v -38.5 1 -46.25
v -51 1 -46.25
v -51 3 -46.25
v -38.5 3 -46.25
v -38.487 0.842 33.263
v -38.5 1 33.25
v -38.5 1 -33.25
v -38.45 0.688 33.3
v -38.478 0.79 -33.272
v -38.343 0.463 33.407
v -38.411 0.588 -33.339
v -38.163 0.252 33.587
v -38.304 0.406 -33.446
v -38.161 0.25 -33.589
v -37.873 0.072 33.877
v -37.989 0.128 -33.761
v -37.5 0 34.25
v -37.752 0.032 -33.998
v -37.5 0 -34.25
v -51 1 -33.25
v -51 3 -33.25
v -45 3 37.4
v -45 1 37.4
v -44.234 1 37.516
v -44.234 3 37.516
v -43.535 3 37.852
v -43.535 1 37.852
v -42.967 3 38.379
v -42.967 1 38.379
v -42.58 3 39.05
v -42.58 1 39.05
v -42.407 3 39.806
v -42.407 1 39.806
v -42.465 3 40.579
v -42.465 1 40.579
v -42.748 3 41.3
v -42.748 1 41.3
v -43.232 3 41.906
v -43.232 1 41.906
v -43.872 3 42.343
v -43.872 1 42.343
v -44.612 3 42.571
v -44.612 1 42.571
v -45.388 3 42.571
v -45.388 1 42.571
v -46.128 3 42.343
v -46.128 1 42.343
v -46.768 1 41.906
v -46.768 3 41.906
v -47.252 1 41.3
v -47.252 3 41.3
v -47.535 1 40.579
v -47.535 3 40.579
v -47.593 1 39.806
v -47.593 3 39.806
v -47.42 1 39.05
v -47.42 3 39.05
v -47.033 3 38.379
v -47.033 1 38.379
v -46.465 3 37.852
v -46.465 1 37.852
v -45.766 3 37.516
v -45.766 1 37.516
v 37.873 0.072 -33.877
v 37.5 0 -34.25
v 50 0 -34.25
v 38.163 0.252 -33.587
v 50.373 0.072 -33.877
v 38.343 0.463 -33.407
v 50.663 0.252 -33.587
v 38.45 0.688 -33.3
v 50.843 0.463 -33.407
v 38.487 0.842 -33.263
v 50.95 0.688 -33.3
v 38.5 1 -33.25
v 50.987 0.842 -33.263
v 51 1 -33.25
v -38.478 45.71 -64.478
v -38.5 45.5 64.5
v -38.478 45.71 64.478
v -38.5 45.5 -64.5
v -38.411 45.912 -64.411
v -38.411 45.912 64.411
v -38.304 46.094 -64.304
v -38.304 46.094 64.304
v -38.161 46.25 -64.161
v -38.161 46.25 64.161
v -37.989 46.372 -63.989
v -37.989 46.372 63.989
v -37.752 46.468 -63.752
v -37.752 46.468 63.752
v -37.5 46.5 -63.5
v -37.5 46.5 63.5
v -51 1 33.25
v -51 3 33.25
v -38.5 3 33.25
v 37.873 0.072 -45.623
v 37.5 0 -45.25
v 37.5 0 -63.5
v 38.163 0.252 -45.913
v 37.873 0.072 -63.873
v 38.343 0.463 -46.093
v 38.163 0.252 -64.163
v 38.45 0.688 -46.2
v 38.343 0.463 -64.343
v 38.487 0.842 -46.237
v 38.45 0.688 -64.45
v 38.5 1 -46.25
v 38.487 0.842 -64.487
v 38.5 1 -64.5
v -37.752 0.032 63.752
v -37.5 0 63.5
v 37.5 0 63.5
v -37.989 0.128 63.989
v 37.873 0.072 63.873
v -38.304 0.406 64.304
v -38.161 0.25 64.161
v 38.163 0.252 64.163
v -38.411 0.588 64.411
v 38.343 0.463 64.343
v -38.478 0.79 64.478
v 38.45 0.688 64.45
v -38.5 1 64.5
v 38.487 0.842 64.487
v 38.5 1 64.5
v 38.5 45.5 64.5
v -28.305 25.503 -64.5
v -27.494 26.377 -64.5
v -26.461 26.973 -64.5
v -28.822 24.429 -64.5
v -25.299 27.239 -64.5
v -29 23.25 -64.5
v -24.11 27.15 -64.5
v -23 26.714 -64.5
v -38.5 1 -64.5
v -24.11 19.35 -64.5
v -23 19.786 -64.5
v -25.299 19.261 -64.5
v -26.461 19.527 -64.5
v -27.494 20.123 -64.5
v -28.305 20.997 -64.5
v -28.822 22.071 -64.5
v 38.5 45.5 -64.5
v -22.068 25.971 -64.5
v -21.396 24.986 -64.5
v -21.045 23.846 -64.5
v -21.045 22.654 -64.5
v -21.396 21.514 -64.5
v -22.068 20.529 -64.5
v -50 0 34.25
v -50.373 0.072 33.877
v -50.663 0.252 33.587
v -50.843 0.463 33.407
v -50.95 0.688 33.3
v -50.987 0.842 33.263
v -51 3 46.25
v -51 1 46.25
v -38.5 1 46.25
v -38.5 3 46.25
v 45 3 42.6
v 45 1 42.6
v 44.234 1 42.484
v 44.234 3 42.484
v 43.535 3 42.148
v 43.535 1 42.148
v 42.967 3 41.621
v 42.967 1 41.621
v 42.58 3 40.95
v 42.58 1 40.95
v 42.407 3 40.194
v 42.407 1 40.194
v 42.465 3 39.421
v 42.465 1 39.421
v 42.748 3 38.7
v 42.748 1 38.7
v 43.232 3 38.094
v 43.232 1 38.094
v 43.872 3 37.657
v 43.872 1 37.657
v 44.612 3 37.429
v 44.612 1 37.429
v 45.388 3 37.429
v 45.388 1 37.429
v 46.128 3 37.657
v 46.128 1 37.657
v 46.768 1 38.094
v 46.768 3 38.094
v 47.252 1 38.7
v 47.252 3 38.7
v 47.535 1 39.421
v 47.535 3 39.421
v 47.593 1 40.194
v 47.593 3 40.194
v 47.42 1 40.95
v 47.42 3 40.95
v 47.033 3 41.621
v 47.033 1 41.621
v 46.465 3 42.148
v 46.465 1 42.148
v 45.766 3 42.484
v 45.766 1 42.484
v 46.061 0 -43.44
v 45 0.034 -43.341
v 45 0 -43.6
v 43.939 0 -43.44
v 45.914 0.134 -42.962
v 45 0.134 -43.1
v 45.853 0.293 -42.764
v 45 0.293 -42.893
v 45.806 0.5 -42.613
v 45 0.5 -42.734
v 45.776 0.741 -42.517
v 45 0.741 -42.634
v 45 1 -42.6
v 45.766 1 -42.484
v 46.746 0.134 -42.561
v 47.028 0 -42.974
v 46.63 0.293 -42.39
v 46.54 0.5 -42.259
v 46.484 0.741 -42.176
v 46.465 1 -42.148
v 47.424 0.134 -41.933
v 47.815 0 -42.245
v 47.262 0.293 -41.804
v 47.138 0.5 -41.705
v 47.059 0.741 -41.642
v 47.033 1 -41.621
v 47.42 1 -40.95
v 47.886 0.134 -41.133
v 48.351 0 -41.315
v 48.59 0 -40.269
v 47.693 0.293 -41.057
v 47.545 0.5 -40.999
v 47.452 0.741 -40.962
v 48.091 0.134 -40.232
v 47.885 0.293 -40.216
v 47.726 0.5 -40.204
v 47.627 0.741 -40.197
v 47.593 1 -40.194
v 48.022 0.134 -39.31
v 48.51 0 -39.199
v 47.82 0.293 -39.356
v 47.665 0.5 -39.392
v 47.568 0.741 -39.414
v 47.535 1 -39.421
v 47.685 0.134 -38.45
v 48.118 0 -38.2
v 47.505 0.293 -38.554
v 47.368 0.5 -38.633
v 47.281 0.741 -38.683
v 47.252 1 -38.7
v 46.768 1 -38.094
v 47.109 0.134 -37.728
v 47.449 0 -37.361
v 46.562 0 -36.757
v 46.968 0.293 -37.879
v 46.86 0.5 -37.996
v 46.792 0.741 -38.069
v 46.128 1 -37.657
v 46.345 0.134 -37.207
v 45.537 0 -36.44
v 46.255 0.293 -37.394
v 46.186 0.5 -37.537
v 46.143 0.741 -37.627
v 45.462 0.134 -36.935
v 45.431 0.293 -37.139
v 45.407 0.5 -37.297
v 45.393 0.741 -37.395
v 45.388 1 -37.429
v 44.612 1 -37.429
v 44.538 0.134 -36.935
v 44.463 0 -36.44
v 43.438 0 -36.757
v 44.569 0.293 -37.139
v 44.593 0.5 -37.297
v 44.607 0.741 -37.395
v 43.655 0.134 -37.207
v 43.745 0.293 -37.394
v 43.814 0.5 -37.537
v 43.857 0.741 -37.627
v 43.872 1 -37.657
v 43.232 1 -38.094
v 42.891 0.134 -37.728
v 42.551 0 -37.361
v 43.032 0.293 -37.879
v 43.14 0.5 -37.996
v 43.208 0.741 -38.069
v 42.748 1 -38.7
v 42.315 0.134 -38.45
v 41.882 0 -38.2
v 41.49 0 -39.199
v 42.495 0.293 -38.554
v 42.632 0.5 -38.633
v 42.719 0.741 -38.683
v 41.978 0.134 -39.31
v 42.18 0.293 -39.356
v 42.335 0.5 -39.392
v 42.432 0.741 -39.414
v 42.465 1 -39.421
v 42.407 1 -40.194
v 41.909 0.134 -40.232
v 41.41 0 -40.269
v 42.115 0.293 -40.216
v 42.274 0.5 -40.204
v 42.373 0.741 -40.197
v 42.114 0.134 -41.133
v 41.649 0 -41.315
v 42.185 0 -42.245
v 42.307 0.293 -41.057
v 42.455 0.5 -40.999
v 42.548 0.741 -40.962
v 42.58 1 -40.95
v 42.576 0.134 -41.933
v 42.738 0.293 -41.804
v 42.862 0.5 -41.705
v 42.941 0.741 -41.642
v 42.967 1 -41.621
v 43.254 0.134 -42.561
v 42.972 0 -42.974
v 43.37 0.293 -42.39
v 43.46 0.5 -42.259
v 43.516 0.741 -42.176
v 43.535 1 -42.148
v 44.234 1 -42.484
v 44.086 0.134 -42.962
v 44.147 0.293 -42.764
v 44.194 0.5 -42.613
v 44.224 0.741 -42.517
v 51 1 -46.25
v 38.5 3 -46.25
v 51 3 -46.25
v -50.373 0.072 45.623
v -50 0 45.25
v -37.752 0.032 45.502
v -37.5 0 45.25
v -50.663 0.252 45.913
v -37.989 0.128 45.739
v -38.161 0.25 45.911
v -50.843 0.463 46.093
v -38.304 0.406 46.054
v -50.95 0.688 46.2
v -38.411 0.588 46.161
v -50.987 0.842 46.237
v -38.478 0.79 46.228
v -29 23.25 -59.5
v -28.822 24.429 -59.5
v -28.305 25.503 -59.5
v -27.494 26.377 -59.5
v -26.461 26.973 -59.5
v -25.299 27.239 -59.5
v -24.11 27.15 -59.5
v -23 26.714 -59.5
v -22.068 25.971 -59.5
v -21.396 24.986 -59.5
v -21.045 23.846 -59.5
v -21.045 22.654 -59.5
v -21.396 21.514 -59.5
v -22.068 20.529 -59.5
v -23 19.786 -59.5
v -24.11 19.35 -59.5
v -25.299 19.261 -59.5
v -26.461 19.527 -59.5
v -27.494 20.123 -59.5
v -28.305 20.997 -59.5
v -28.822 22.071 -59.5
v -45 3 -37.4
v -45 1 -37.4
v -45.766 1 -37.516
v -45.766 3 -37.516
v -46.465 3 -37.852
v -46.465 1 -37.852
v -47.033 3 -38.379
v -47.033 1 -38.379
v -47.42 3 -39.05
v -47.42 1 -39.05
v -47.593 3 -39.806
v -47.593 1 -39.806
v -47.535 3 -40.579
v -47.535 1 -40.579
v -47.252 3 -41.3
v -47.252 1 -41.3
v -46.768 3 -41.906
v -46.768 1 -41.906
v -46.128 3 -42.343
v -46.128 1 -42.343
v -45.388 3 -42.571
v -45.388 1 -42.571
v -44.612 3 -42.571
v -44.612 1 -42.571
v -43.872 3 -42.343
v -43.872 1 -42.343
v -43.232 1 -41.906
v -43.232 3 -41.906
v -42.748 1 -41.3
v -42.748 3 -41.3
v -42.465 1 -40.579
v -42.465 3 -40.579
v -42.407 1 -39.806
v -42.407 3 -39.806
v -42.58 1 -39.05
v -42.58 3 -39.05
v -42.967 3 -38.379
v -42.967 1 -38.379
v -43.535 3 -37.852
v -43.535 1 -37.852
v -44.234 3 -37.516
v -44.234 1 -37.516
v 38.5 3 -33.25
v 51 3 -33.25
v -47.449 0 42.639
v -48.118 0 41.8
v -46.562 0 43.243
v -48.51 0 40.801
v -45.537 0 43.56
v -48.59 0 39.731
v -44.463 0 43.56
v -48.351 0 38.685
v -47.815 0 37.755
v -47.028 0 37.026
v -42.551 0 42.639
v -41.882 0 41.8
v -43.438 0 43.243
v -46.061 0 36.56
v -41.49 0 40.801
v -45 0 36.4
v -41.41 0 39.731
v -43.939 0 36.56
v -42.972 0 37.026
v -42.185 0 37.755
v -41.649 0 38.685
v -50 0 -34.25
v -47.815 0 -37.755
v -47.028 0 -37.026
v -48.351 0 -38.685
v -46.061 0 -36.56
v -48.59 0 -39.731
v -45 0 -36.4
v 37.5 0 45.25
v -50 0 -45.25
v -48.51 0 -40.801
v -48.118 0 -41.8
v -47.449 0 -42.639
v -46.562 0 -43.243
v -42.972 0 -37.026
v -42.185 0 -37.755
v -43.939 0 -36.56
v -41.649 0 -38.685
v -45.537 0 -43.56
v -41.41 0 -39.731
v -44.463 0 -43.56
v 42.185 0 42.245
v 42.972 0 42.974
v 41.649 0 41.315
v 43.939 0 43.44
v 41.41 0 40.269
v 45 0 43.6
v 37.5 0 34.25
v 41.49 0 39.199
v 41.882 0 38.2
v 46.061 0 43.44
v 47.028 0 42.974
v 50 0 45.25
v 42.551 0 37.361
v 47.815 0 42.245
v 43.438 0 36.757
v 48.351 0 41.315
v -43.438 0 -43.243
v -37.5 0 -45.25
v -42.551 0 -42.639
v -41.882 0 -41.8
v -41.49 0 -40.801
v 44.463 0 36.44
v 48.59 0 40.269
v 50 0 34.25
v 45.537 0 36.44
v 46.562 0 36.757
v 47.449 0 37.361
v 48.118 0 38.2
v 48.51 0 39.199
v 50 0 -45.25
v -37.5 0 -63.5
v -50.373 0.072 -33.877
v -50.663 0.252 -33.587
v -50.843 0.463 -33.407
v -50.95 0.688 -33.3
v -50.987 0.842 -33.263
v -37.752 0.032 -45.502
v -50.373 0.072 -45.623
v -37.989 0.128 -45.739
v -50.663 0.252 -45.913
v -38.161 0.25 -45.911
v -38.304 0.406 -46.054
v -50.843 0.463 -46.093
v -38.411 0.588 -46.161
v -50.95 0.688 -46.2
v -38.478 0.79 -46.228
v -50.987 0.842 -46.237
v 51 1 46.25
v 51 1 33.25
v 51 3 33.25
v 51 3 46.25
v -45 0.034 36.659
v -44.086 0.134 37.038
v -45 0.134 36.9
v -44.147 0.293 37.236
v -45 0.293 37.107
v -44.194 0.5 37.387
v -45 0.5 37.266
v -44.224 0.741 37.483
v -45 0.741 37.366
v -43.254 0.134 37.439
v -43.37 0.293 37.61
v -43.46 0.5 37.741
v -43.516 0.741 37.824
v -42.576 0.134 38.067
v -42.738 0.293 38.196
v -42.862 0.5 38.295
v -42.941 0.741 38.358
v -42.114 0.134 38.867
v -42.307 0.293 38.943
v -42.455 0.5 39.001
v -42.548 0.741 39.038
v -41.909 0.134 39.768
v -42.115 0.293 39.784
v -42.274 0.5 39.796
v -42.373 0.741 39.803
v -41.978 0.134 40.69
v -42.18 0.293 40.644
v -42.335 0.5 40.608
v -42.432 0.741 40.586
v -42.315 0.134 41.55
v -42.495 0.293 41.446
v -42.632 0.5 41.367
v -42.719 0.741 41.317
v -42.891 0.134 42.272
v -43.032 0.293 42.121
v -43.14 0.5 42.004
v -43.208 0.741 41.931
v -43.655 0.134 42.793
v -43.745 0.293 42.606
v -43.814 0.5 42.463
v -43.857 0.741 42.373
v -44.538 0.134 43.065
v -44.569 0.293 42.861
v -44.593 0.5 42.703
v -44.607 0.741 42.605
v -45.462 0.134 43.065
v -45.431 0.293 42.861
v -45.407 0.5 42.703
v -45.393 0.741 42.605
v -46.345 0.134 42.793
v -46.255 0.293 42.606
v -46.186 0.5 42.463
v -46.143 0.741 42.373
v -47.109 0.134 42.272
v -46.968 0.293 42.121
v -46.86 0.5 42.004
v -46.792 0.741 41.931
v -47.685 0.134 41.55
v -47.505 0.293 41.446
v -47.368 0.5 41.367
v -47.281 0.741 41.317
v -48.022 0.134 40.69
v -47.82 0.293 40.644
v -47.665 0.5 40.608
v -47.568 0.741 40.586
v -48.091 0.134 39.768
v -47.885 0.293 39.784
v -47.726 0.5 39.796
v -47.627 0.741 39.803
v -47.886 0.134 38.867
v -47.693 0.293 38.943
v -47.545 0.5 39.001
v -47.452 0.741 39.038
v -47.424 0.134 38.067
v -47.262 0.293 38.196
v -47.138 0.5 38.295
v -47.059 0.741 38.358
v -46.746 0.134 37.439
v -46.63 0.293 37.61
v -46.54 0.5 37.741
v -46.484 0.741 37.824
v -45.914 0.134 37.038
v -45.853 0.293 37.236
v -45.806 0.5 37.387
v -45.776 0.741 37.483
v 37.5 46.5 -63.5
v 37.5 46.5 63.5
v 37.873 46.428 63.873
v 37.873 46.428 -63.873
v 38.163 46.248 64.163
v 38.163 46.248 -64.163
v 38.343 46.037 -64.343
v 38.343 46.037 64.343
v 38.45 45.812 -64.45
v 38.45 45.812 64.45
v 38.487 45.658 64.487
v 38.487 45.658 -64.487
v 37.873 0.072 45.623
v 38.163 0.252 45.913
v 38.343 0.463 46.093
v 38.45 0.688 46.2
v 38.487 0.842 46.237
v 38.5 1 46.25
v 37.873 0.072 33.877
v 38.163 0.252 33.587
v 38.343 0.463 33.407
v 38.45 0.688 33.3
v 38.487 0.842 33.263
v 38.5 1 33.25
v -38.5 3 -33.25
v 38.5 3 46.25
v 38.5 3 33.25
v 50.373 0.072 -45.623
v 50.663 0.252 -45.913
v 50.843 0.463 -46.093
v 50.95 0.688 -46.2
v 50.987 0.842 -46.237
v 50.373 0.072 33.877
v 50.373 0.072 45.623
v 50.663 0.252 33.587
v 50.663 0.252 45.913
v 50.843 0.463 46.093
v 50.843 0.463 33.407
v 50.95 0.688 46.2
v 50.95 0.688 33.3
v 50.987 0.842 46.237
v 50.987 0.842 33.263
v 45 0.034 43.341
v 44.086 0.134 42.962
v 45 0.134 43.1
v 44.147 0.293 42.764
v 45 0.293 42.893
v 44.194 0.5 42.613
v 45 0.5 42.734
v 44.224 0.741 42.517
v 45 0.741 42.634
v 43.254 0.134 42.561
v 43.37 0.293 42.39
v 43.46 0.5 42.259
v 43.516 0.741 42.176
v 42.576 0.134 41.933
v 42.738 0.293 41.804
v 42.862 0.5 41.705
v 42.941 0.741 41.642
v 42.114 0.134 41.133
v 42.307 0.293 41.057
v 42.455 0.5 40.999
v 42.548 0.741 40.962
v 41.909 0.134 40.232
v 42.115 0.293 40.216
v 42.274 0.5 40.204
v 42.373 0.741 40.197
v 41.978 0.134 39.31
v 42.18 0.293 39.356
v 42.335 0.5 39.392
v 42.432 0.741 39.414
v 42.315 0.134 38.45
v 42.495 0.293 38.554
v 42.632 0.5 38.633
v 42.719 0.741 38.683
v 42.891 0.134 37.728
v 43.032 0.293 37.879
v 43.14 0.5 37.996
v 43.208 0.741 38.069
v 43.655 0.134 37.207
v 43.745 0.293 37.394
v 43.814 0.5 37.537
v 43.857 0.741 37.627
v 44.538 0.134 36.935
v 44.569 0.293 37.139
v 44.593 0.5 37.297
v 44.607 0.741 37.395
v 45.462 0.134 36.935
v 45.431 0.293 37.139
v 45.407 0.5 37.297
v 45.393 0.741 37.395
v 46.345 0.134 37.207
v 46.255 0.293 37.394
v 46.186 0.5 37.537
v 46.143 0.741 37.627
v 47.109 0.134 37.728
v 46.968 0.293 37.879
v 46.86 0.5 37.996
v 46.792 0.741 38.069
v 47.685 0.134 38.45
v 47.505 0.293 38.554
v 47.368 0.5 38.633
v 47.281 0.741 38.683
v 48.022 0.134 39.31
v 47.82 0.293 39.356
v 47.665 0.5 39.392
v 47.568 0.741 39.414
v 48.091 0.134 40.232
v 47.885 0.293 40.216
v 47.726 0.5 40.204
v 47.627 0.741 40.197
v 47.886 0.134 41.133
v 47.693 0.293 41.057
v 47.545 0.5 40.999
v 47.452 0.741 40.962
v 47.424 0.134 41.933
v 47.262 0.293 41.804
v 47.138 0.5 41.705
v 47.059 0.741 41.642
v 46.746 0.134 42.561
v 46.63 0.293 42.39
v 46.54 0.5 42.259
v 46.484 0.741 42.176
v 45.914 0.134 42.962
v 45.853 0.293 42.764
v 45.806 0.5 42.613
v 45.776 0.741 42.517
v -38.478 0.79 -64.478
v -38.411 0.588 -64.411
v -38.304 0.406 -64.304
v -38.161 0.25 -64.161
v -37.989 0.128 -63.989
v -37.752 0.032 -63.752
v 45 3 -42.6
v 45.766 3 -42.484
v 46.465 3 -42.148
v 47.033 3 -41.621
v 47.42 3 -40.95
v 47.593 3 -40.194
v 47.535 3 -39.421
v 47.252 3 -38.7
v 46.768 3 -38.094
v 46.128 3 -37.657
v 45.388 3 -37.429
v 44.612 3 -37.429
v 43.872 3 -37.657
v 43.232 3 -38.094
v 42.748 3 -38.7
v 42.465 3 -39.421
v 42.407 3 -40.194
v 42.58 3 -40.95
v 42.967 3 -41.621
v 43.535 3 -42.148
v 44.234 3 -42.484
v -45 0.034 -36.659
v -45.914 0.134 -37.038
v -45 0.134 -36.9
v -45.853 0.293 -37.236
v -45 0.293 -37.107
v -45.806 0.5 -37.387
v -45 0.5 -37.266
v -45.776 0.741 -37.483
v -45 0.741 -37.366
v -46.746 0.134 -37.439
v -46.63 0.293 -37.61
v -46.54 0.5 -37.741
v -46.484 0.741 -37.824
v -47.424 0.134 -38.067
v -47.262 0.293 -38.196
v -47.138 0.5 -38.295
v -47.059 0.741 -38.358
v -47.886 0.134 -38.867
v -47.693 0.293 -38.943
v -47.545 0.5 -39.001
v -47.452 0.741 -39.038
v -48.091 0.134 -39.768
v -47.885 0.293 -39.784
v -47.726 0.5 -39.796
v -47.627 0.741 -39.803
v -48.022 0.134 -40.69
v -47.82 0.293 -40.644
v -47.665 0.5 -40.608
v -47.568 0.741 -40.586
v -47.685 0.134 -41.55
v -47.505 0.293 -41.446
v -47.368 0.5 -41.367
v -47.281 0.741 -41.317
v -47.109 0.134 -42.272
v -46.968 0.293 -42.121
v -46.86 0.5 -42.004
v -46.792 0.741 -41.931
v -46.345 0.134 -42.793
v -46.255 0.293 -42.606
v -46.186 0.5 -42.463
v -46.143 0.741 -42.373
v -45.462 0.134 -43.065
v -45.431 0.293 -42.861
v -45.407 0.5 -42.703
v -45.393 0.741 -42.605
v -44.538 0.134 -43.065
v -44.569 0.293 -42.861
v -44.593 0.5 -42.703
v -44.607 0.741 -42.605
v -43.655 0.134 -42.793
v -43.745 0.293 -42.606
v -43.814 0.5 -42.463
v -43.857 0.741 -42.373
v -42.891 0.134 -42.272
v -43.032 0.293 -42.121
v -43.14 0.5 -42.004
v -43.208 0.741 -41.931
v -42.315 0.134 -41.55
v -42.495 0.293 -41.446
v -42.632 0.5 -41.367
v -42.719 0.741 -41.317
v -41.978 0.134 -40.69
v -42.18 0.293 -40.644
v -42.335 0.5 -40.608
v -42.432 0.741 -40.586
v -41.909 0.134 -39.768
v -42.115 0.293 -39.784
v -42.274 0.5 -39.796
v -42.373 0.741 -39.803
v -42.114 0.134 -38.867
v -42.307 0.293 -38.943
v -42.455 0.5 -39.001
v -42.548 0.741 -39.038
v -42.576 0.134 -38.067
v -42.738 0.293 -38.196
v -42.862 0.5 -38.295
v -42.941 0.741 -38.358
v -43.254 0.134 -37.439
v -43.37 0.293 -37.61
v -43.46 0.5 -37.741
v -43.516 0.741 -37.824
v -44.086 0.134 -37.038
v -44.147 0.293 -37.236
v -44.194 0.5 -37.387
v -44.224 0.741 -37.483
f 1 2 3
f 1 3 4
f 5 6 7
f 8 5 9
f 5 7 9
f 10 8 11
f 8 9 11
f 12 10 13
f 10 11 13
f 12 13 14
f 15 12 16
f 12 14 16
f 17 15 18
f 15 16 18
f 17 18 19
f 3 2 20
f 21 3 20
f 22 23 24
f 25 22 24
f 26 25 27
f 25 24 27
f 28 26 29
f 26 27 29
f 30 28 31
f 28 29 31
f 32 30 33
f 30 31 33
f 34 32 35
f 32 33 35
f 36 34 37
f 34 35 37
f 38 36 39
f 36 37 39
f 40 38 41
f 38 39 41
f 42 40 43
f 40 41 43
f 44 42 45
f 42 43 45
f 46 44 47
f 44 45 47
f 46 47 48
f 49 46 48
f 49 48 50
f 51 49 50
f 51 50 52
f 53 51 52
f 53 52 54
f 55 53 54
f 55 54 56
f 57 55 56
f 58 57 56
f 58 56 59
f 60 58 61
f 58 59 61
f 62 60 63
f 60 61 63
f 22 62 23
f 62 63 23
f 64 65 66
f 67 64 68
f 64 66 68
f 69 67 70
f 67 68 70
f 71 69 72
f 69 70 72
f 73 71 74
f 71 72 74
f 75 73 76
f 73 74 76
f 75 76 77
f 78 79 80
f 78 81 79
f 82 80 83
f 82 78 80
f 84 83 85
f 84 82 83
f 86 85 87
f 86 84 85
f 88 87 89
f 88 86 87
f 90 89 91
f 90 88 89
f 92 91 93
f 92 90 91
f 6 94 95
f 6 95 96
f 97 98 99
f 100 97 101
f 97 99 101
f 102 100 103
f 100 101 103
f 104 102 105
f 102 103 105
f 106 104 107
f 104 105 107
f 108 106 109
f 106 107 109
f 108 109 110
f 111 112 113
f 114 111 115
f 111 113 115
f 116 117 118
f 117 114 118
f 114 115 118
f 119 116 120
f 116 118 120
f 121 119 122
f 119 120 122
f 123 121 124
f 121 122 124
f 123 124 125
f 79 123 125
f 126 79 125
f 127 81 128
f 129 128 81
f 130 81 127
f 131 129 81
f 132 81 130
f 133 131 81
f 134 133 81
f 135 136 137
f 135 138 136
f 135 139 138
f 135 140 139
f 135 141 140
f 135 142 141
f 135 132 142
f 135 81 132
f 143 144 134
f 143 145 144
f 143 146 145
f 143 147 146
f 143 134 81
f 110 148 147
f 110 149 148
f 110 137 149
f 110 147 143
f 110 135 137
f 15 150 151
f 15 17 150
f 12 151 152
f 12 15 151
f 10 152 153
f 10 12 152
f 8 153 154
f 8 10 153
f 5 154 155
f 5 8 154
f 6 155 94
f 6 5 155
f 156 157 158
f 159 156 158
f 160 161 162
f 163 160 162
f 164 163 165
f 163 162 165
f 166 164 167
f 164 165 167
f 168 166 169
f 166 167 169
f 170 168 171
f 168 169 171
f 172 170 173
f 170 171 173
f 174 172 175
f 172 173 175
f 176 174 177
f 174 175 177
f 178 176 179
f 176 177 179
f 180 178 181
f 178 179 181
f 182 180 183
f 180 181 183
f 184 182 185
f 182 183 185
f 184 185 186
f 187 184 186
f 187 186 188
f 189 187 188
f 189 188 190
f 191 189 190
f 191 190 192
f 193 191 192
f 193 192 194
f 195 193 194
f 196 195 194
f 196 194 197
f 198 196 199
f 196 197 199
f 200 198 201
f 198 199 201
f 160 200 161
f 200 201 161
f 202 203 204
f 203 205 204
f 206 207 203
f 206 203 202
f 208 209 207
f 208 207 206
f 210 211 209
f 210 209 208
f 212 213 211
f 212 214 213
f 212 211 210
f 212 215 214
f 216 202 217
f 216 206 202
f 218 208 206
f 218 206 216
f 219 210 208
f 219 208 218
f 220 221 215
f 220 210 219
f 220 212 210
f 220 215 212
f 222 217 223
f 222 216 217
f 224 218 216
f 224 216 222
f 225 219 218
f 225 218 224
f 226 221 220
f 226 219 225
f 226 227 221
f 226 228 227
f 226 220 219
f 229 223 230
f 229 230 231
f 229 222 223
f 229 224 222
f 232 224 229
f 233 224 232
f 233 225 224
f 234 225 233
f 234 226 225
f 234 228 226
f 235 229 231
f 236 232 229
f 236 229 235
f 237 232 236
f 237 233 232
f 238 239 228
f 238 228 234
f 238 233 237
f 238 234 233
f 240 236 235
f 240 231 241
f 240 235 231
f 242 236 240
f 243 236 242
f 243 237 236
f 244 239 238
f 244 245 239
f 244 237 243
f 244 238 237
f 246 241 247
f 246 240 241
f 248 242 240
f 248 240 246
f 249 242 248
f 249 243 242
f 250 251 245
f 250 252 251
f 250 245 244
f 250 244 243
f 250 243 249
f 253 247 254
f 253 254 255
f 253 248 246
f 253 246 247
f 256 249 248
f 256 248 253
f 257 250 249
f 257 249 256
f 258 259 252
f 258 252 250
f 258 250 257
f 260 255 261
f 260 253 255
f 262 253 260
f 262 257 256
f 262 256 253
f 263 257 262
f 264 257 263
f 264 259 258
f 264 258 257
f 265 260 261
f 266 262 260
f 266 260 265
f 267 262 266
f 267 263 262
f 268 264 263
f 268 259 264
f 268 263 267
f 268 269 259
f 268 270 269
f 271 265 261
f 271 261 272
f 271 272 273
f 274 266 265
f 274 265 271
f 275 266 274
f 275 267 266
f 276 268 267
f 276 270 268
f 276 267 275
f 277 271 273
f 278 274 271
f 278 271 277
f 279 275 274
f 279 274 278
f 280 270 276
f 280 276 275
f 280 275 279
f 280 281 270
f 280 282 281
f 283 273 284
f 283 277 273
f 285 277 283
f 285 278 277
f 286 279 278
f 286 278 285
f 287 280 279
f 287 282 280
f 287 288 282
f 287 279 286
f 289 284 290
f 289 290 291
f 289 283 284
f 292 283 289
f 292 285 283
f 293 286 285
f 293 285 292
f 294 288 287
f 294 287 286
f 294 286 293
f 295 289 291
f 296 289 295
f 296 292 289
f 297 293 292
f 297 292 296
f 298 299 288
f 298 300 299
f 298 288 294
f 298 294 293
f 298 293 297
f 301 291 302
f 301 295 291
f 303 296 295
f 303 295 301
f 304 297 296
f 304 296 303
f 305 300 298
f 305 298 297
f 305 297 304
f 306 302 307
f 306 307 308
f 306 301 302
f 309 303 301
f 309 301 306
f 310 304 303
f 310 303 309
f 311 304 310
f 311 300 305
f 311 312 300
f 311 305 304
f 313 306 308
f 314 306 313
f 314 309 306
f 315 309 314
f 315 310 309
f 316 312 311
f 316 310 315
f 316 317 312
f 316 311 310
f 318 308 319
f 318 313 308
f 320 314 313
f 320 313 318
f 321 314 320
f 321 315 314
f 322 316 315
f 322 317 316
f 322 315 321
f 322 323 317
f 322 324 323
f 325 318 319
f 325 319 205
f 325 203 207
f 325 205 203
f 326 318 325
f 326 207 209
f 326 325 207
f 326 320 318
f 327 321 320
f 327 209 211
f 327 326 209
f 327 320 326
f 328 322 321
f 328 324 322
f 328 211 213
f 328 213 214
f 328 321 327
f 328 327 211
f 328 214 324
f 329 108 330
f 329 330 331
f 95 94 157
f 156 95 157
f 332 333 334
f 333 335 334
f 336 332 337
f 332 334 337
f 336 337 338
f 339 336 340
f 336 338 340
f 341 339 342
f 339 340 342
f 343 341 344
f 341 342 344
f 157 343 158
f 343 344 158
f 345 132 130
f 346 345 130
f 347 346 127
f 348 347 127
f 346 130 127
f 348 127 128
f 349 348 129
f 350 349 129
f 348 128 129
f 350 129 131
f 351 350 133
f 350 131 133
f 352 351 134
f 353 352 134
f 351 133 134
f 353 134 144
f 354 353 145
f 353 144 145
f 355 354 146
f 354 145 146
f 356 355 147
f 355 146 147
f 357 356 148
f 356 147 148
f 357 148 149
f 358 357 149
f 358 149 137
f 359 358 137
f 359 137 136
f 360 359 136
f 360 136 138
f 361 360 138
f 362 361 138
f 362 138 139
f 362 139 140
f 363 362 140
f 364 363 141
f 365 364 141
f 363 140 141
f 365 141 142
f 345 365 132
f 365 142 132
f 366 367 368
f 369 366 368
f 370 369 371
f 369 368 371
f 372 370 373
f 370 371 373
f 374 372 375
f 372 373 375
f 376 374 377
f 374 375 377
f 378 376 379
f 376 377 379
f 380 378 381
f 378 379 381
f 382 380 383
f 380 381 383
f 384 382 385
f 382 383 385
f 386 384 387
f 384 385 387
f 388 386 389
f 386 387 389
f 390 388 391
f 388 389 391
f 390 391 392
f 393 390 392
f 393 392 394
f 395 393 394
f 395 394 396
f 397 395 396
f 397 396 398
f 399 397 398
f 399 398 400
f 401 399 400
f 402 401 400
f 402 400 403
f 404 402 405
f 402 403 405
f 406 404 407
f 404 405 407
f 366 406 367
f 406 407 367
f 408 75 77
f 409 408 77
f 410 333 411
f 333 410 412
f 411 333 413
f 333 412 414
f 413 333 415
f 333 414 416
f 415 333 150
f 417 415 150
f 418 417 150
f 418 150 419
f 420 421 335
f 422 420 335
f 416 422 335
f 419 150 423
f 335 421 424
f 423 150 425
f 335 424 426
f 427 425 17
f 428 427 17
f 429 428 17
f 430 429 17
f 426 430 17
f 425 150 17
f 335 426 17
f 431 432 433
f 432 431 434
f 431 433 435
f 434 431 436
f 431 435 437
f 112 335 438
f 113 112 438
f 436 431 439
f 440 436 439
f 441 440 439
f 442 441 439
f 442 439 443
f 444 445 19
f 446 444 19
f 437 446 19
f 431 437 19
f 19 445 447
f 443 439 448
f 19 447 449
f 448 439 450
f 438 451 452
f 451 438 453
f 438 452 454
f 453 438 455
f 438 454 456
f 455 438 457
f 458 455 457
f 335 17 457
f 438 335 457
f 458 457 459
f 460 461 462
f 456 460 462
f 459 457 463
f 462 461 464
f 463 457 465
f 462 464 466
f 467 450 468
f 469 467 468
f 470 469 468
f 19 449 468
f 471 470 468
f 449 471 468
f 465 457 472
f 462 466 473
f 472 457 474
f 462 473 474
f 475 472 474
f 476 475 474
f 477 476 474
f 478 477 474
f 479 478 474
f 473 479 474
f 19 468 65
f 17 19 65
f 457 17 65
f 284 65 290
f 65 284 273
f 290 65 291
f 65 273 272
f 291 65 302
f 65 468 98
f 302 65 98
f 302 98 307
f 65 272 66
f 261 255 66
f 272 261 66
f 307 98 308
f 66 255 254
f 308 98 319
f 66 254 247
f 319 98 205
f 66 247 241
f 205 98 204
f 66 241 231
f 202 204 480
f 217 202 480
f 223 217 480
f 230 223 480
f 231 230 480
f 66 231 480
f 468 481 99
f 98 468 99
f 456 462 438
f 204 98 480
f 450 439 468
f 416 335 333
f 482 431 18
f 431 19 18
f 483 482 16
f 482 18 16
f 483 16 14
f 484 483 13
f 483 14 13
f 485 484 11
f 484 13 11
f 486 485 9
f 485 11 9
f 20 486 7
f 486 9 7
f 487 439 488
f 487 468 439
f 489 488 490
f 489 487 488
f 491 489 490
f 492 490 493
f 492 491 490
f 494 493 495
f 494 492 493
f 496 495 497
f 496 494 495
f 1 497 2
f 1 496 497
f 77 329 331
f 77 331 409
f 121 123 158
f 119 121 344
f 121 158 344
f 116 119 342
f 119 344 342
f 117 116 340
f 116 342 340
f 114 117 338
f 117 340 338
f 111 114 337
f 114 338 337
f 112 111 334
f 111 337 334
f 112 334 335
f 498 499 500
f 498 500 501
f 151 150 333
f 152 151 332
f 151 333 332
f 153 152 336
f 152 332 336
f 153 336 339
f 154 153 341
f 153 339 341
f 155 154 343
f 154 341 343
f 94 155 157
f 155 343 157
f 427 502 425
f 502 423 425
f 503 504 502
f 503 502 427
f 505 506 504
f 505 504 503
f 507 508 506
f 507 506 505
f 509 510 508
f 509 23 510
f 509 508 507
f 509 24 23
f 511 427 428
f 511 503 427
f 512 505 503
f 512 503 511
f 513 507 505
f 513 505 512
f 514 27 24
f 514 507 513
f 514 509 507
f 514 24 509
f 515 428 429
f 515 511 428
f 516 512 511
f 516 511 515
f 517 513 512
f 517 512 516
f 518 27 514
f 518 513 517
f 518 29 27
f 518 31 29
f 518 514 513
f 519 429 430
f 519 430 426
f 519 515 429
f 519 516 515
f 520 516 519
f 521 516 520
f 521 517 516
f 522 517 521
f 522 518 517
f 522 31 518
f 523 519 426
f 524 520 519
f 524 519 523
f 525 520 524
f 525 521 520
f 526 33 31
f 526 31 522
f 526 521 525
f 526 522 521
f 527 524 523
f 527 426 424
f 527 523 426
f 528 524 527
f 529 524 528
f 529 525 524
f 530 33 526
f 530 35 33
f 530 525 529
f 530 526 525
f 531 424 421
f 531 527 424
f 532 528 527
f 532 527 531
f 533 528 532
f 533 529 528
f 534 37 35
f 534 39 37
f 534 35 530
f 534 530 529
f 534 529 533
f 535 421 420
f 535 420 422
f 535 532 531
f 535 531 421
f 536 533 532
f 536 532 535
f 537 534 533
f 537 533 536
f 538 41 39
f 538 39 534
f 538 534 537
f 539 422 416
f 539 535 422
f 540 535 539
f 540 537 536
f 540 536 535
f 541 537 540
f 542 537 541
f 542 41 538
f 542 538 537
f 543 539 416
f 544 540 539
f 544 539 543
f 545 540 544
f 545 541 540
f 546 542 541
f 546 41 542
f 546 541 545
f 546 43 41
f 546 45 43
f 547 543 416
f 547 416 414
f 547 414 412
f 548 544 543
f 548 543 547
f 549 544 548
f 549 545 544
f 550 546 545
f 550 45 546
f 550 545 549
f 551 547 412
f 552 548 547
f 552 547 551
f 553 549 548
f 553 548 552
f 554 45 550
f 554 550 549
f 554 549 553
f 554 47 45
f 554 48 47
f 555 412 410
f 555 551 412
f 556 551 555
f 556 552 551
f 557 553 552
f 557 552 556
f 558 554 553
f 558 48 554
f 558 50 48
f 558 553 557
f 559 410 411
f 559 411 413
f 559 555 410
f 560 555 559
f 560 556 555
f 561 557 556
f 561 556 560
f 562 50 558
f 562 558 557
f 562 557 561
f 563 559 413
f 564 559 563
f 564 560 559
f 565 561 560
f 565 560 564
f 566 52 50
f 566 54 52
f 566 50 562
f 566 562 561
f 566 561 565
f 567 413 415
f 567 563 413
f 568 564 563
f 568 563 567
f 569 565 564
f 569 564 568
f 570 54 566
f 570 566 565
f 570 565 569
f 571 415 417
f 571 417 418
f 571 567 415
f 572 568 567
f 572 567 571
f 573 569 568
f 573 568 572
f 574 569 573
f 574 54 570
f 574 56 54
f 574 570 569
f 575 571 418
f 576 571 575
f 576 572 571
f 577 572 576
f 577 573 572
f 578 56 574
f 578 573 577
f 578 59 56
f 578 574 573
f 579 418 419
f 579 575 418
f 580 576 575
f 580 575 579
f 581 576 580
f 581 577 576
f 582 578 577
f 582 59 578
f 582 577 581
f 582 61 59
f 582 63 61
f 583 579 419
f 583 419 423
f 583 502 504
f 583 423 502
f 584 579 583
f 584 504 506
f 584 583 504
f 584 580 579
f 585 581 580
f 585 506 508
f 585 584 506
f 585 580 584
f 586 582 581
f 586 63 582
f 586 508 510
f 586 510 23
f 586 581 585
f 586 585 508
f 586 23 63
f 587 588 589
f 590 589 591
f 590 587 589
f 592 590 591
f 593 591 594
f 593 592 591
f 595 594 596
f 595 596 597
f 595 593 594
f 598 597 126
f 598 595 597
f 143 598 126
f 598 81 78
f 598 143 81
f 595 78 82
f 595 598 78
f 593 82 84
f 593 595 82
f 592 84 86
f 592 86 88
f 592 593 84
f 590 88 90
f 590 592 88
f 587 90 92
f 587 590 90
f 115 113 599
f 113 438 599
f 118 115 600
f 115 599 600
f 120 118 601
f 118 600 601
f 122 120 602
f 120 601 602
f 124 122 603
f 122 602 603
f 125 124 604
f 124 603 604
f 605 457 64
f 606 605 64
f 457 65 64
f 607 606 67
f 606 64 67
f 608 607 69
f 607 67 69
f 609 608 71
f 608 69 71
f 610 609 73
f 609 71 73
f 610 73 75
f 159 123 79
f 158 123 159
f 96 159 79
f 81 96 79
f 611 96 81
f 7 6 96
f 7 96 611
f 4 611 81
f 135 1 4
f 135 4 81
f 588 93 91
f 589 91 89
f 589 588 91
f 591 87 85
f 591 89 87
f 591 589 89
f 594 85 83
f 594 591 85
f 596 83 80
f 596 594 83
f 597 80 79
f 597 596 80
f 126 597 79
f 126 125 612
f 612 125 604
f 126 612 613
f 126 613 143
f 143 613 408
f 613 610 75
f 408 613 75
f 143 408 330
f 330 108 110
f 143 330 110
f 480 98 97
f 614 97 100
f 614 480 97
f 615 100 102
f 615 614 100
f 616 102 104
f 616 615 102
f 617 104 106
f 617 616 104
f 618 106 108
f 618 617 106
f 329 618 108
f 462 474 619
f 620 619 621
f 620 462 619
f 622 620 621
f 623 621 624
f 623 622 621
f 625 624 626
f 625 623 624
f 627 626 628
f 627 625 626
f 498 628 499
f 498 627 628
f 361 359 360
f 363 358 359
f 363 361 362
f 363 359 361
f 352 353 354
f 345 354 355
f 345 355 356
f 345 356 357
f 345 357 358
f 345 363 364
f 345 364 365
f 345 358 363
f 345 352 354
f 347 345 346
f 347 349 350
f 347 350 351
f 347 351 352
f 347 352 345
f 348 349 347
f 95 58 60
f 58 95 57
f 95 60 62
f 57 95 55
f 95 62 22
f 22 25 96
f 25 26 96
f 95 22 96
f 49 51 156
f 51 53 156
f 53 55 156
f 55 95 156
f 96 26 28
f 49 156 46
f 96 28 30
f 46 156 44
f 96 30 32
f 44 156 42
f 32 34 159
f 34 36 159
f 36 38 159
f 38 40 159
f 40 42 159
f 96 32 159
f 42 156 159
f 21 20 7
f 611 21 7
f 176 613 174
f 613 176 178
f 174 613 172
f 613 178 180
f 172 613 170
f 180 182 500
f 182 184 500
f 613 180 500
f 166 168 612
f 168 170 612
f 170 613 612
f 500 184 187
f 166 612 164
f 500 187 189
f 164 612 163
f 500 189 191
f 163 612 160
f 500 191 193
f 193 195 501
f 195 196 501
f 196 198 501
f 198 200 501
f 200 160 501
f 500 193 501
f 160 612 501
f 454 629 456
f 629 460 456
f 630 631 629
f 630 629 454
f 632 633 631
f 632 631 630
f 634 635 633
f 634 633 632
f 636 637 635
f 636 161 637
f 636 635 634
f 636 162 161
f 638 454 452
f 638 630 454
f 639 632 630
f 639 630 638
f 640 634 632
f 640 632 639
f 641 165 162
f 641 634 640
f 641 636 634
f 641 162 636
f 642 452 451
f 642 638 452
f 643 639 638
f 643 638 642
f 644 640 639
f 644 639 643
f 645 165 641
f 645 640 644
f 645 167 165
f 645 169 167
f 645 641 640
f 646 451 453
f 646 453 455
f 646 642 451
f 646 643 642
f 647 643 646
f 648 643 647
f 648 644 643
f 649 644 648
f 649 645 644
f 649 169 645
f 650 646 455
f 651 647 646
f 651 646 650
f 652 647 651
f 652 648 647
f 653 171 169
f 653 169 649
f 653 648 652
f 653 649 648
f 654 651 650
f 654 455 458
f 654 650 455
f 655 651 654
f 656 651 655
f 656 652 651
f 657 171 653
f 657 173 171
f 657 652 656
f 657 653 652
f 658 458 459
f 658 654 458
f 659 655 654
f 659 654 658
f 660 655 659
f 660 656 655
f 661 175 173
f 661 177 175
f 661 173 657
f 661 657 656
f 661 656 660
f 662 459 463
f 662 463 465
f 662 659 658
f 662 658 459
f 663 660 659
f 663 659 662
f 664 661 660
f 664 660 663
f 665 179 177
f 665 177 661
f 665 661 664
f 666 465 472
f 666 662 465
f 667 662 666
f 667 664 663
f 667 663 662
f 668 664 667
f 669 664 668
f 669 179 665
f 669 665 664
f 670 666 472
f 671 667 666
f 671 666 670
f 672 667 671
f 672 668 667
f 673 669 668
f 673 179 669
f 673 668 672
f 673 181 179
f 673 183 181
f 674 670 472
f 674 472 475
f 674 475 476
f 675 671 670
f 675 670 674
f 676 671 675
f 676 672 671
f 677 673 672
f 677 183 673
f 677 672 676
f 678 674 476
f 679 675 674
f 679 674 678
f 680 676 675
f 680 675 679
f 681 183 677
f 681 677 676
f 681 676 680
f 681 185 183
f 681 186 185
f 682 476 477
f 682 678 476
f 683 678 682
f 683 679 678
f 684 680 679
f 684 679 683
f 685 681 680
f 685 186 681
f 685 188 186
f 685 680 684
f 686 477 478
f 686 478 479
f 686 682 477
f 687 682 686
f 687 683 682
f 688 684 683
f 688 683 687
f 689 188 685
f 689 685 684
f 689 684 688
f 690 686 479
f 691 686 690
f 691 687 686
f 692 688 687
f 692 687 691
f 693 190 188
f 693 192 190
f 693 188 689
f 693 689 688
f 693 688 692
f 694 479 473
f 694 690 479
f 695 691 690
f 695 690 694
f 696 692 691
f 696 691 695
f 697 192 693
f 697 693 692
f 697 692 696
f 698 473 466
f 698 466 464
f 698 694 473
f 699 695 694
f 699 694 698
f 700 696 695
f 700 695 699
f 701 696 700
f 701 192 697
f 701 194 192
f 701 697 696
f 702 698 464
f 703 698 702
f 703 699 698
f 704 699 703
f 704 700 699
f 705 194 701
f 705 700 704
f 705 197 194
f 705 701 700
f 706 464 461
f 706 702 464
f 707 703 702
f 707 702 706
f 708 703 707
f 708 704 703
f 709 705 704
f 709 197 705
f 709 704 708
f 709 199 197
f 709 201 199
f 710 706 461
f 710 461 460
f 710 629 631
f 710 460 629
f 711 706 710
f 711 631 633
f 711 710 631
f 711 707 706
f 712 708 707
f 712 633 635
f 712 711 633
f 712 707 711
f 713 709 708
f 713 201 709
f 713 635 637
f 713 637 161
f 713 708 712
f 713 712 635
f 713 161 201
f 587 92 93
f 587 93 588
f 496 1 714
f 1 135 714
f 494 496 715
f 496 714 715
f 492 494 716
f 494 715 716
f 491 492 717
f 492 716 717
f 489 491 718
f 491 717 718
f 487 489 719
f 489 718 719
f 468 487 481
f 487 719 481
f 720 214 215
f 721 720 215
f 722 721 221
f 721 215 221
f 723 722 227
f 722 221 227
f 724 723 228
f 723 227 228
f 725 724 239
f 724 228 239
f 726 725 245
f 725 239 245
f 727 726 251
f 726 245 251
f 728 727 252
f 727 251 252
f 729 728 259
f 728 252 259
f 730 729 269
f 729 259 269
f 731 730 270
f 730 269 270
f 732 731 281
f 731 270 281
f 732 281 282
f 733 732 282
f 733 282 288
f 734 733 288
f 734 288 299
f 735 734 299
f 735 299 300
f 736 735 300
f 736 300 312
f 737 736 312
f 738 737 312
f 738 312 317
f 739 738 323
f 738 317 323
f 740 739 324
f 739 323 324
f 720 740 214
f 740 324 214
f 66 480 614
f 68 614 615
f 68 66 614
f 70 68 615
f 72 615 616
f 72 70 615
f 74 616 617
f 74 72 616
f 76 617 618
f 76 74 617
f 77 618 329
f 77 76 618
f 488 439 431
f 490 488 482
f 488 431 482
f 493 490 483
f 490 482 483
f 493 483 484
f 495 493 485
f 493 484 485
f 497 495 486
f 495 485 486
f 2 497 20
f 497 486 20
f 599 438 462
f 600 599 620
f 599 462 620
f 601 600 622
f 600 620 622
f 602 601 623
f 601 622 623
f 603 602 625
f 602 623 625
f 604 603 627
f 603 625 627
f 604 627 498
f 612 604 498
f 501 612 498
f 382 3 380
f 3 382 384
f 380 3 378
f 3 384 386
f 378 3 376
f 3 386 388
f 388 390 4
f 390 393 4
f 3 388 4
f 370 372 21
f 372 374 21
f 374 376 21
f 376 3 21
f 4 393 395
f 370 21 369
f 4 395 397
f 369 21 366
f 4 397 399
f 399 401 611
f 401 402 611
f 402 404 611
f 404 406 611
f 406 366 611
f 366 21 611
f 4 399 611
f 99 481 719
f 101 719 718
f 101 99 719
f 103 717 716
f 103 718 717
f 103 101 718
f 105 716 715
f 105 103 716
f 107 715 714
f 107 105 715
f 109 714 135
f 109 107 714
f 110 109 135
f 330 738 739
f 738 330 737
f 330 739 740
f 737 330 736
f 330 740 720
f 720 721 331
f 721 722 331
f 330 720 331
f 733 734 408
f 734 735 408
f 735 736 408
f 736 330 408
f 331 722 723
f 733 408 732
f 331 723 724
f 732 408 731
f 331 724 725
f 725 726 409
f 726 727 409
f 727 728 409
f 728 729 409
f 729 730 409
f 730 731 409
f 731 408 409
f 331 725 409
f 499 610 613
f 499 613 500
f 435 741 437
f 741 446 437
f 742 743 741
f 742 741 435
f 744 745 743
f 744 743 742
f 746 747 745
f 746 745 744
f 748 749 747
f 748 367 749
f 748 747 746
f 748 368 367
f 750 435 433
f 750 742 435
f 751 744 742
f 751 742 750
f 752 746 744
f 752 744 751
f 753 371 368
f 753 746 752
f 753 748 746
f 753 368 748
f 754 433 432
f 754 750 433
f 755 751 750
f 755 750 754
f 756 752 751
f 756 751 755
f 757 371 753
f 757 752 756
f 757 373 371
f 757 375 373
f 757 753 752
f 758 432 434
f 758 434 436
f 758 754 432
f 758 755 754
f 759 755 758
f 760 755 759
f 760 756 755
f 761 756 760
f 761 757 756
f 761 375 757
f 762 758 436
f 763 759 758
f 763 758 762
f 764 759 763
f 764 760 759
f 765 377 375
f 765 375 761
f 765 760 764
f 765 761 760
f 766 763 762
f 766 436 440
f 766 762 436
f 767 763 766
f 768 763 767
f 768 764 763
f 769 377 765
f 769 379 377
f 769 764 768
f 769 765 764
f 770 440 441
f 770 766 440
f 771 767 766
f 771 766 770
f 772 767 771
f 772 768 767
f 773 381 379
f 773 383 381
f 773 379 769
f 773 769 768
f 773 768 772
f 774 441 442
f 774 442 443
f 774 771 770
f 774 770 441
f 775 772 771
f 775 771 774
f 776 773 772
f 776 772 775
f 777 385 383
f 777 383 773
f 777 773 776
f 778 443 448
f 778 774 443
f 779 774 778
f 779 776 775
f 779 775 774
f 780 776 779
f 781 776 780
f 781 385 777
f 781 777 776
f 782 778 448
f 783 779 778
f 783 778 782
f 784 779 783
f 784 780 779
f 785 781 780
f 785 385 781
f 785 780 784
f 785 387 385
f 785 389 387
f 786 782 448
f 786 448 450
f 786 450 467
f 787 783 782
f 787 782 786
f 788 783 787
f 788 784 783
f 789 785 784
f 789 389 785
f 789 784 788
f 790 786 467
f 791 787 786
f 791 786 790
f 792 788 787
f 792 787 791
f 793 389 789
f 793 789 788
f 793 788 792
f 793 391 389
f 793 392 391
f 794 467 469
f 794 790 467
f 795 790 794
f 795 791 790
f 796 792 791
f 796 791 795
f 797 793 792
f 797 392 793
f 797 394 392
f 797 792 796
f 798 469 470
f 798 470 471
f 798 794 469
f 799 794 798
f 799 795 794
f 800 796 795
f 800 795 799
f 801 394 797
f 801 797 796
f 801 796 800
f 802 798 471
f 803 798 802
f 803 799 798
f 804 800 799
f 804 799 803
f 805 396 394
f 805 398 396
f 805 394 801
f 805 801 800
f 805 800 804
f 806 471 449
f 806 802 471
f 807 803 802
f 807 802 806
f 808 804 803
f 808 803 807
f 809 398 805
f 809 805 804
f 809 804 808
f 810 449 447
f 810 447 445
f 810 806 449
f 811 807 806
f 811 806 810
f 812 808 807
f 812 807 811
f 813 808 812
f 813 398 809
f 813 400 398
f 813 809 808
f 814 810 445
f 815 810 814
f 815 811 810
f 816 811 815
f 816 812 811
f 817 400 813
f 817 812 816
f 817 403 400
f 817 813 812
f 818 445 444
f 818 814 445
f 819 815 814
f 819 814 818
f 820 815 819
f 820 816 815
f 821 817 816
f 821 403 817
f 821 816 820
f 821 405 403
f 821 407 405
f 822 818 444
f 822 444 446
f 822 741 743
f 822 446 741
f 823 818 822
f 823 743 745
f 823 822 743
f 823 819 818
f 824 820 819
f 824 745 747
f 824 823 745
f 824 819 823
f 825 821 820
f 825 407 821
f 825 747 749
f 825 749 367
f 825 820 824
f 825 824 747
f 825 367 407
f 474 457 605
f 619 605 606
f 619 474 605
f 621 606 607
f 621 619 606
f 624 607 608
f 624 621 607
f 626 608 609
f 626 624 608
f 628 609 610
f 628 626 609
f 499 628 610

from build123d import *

# Parameters (mm, degrees)
SKETCH_1_W          = 77
SKETCH_1_H          = 129
EXTRUDE_1_DEPTH     = 46.5
SKETCH_2_W          = 12.5
SKETCH_2_H          = 13
SKETCH_2_R          = 2.6
EXTRUDE_2_DEPTH     = 3
SKETCH_3_R          = 4
CUT_EXTRUDE_1_DEPTH = 5
FILLET_1_R          = 1


with BuildPart() as part:
    # 草图1 → 凸台-拉伸1 (new body)
    with BuildSketch(Plane(origin=(0, 0, 0), x_dir=(1, 0, 0), z_dir=(0, 1, 0))):
        Rectangle(SKETCH_1_W, SKETCH_1_H)
    extrude(amount=EXTRUDE_1_DEPTH)

    # 草图2 → 凸台-拉伸2 (add)
    # profile 1 of 4: a face of its own
    with BuildSketch(Plane.XZ):
        with Locations((-44.75, 39.75)):
            Rectangle(SKETCH_2_W, SKETCH_2_H)
        with Locations(Location((-45, 40, 0), (0, 0, 270))):
            Circle(SKETCH_2_R, mode=Mode.SUBTRACT)
    # profile 2 of 4: a face of its own
    with BuildSketch(Plane.XZ):
        with Locations((44.75, 39.75)):
            Rectangle(SKETCH_2_W, SKETCH_2_H)
        with Locations(Location((45, 40, 0), (0, 0, 90))):
            Circle(SKETCH_2_R, mode=Mode.SUBTRACT)
    # profile 3 of 4: a face of its own
    with BuildSketch(Plane.XZ):
        with Locations((44.75, -39.75)):
            Rectangle(SKETCH_2_W, SKETCH_2_H)
        with Locations(Location((45, -40, 0), (0, 0, 270))):
            Circle(SKETCH_2_R, mode=Mode.SUBTRACT)
    # profile 4 of 4: a face of its own
    with BuildSketch(Plane.XZ):
        with Locations((-44.75, -39.75)):
            Rectangle(SKETCH_2_W, SKETCH_2_H)
        with Locations(Location((-45, -40, 0), (0, 0, 90))):
            Circle(SKETCH_2_R, mode=Mode.SUBTRACT)
    extrude(amount=-EXTRUDE_2_DEPTH)

    # 草图3 → 切除-拉伸1 (cut)
    with BuildSketch(Plane(origin=(0, 0, -64.5), x_dir=(-1, 0, 0), z_dir=(0, 0, -1))):
        with Locations((25, 23.25)):
            Circle(SKETCH_3_R)
    extrude(amount=-CUT_EXTRUDE_1_DEPTH, mode=Mode.SUBTRACT)

    # 圆角1
    fillet_1_edges = [part.edges().sort_by_distance(p)[0] for p in [
        (-38.5, 46.5, 0),
        (-38.5, 0, 55.375),
        (0, 46.5, 64.5),
        (-44.75, 0, 46.25),
        (-51, 0, 39.75),
        (-44.75, 0, 33.25),
        (-45, 0, 42.6),
        (38.5, 0, 0),
        (44.75, 0, 33.25),
        (51, 0, 39.75),
        (44.75, 0, 46.25),
        (45, 0, 37.4),
        (38.5, 0, -55.375),
        (44.75, 0, -46.25),
        (51, 0, -39.75),
        (44.75, 0, -33.25),
        (45, 0, -37.4),
        (38.5, 46.5, 0),
        (0, 0, 64.5),
        (-38.5, 0, 0),
        (-38.5, 0, -55.375),
        (-44.75, 0, -33.25),
        (-51, 0, -39.75),
        (-44.75, 0, -46.25),
        (-45, 0, -42.6),
        (0, 0, -64.5),
        (38.5, 0, 55.375),
        (0, 46.5, -64.5),
    ]]
    fillet(fillet_1_edges, radius=FILLET_1_R)


solid = part.part
